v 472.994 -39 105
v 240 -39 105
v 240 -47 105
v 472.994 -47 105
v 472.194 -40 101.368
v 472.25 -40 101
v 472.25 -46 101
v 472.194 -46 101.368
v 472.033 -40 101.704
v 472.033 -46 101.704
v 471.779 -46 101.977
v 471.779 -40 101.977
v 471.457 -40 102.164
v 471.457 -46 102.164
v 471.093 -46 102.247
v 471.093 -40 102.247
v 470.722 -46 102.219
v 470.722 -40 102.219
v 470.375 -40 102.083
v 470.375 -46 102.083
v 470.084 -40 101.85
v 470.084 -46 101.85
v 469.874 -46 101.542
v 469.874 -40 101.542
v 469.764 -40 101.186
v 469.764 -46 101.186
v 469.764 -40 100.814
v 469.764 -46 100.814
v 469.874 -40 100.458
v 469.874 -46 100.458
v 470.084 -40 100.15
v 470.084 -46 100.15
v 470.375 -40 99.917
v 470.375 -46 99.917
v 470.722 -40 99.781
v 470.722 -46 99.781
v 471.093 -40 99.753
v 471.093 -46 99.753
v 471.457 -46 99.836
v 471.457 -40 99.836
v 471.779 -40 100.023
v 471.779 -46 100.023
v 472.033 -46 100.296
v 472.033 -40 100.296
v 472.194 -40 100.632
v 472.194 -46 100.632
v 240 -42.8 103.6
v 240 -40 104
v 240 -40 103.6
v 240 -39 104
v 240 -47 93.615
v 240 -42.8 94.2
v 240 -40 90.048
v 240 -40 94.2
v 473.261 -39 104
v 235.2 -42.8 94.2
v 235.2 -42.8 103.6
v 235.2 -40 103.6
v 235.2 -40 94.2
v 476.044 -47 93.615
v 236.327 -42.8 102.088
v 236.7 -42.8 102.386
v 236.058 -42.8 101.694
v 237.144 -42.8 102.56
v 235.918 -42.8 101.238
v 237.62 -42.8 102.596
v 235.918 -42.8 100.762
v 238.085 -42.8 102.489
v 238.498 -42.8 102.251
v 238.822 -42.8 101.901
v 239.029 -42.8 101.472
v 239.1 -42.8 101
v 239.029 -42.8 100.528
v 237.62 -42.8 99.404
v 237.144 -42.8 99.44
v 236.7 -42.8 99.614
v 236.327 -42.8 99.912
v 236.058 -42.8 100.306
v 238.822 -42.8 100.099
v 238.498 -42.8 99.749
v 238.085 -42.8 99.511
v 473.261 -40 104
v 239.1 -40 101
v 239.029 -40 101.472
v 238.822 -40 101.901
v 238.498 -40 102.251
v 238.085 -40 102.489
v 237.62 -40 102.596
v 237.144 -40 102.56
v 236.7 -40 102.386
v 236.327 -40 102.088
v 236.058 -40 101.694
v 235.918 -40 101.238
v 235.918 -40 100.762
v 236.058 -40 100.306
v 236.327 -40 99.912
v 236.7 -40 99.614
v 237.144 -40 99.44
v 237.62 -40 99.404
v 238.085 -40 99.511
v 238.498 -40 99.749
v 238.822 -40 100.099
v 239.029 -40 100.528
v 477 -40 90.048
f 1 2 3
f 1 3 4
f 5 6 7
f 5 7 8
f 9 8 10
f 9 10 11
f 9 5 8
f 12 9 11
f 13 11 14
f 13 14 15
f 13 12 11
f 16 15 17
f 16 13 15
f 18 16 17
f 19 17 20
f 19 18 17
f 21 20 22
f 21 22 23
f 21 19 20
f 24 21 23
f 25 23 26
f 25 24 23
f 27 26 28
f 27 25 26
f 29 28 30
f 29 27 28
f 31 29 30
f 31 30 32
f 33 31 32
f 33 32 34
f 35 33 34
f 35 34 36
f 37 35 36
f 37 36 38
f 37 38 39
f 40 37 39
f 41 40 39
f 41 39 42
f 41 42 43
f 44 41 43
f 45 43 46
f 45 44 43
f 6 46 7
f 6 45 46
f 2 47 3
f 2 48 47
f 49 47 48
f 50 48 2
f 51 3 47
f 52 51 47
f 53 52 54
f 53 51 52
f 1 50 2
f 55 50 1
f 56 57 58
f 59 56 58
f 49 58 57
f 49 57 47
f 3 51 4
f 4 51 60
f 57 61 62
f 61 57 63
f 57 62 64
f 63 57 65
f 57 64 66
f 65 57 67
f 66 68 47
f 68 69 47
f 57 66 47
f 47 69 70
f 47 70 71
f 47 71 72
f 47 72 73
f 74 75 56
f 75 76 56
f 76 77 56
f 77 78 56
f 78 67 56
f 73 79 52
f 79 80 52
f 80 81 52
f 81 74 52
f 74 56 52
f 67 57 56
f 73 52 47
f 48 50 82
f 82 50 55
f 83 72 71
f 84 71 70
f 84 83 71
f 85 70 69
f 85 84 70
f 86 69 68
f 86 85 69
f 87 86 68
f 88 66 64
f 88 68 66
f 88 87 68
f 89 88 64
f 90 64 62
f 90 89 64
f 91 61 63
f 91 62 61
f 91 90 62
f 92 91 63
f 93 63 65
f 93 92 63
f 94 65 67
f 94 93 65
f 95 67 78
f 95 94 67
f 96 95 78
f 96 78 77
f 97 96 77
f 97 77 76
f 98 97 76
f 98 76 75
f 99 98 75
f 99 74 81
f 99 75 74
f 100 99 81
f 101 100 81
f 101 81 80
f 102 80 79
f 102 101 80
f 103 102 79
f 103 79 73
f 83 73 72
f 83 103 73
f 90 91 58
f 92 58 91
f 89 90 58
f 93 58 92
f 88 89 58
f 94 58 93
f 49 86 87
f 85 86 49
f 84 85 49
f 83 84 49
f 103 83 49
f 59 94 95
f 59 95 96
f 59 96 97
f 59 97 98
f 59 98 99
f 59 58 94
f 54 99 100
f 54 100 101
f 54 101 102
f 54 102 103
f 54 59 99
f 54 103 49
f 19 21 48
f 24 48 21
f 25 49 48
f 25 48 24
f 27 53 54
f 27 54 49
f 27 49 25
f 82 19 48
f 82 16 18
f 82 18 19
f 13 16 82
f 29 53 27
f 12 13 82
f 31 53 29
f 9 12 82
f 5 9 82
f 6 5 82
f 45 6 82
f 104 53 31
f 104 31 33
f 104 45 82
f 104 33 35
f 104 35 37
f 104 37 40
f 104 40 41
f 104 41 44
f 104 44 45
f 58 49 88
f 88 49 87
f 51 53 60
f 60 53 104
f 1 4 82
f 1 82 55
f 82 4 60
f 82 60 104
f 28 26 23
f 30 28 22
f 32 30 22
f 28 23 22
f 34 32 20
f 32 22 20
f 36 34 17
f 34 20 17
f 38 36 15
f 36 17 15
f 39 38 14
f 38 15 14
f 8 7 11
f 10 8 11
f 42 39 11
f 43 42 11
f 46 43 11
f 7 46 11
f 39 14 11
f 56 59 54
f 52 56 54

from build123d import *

# Parameters (mm, degrees)
CYLINDER076_R          = 1.6
CYLINDER076_DEPTH      = 6
CYLINDER076_ROLL_ANGLE = 90
CYLINDER074_R          = 1.25
CYLINDER074_DEPTH      = 6
CYLINDER074_ROLL_ANGLE = 90
BOX077_W               = 4.8
BOX077_H               = 2.8
BOX077_DEPTH           = 9.4
BOX075_W               = 237
BOX075_H               = 8
BOX075_DEPTH           = 15
BOX073_W               = 37
BOX073_H               = 160
BOX073_DEPTH           = 120
BOX073_PITCH_ANGLE     = -15
BOX068_W               = 475
BOX068_H               = 10
BOX068_DEPTH           = 10
BOX068_ROLL_ANGLE      = -27
BOX049_W               = 475
BOX049_H               = 8
BOX049_DEPTH           = 15
BOX069_W               = 475
BOX069_H               = 8
BOX069_DEPTH           = 15


with BuildPart() as cylinder076:
    # Cylinder076 → Cylinder076 (new body)
    with BuildSketch(Plane.XY):
        Circle(CYLINDER076_R)
    extrude(amount=CYLINDER076_DEPTH)


with BuildPart() as cylinder076_1:
    # Cylinder076 roll: moved
    add(cylinder076.part.rotate(Axis((0, 0, 0), (1, 0, 0)), CYLINDER076_ROLL_ANGLE))


with BuildPart() as cylinder076_2:
    # Cylinder076 placement: moved
    add(cylinder076_1.part.moved(Location((237.5, -40, 101))))


with BuildPart() as fusion087:
    # Cylinder074 → Cylinder074 (new body)
    with BuildSketch(Plane.XY):
        Circle(CYLINDER074_R)
    extrude(amount=CYLINDER074_DEPTH)


with BuildPart() as fusion087_1:
    # Cylinder074 roll: moved
    add(fusion087.part.rotate(Axis((0, 0, 0), (1, 0, 0)), CYLINDER074_ROLL_ANGLE))


with BuildPart() as fusion087_2:
    # Cylinder074 placement: moved
    add(fusion087_1.part.moved(Location((471, -40, 101))))

    # Fusion087: union Cylinder076
    add(cylinder076_2.part)


with BuildPart() as cube049:
    # Box077 → Box077 (new body)
    with BuildSketch(Plane(origin=(235.2, -42.8, 94.2), x_dir=(1, 0, 0), z_dir=(0, 0, 1))):
        with Locations((2.4, 1.4)):
            Rectangle(BOX077_W, BOX077_H)
    extrude(amount=BOX077_DEPTH)


with BuildPart() as cube047:
    # Box075 → Box075 (new body)
    with BuildSketch(Plane(origin=(3, -47, 90), x_dir=(1, 0, 0), z_dir=(0, 0, 1))):
        with Locations((118.5, 4)):
            Rectangle(BOX075_W, BOX075_H)
    extrude(amount=BOX075_DEPTH)


with BuildPart() as cube045:
    # Box073 → Box073 (new body)
    with BuildSketch(Plane.XY):
        with Locations((18.5, 80)):
            Rectangle(BOX073_W, BOX073_H)
    extrude(amount=BOX073_DEPTH)


with BuildPart() as cube045_1:
    # Box073 pitch: moved
    add(cube045.part.rotate(Axis((0, 0, 0), (0, 1, 0)), BOX073_PITCH_ANGLE))


with BuildPart() as cube045_2:
    # Box073 placement: moved
    add(cube045_1.part.moved(Location((502.2, -50, -4))))


with BuildPart() as cube040:
    # Box068 → Box068 (new body)
    with BuildSketch(Plane.XY):
        with Locations((237.5, 5)):
            Rectangle(BOX068_W, BOX068_H)
    extrude(amount=BOX068_DEPTH)


with BuildPart() as cube040_1:
    # Box068 roll: moved
    add(cube040.part.rotate(Axis((0, 0, 0), (1, 0, 0)), BOX068_ROLL_ANGLE))


with BuildPart() as cube040_2:
    # Box068 placement: moved
    add(cube040_1.part.moved(Location((0, -53.1, 85.5))))


with BuildPart() as cube021:
    # Box049 → Box049 (new body)
    with BuildSketch(Plane(origin=(0, -40, 89), x_dir=(1, 0, 0), z_dir=(0, 0, 1))):
        with Locations((237.5, 4)):
            Rectangle(BOX049_W, BOX049_H)
    extrude(amount=BOX049_DEPTH)


with BuildPart() as cut093:
    # Box069 → Box069 (new body)
    with BuildSketch(Plane(origin=(0, -47, 90), x_dir=(1, 0, 0), z_dir=(0, 0, 1))):
        with Locations((237.5, 4)):
            Rectangle(BOX069_W, BOX069_H)
    extrude(amount=BOX069_DEPTH)

    # Cut066: cut Cube021
    add(cube021.part, mode=Mode.SUBTRACT)

    # Cut067: cut Cube040
    add(cube040_2.part, mode=Mode.SUBTRACT)


with BuildPart() as cut093_1:
    # Cut067 placement: moved
    add(cut093.part.moved(Location((3, 0, 0))))

    # Cut080: cut Cube045
    add(cube045_2.part, mode=Mode.SUBTRACT)

    # Cut083: cut Cube047
    add(cube047.part, mode=Mode.SUBTRACT)

    # Fusion086: union Cube049
    add(cube049.part)

    # Cut093: cut Fusion087
    add(fusion087_2.part, mode=Mode.SUBTRACT)


solid = cut093_1.part
